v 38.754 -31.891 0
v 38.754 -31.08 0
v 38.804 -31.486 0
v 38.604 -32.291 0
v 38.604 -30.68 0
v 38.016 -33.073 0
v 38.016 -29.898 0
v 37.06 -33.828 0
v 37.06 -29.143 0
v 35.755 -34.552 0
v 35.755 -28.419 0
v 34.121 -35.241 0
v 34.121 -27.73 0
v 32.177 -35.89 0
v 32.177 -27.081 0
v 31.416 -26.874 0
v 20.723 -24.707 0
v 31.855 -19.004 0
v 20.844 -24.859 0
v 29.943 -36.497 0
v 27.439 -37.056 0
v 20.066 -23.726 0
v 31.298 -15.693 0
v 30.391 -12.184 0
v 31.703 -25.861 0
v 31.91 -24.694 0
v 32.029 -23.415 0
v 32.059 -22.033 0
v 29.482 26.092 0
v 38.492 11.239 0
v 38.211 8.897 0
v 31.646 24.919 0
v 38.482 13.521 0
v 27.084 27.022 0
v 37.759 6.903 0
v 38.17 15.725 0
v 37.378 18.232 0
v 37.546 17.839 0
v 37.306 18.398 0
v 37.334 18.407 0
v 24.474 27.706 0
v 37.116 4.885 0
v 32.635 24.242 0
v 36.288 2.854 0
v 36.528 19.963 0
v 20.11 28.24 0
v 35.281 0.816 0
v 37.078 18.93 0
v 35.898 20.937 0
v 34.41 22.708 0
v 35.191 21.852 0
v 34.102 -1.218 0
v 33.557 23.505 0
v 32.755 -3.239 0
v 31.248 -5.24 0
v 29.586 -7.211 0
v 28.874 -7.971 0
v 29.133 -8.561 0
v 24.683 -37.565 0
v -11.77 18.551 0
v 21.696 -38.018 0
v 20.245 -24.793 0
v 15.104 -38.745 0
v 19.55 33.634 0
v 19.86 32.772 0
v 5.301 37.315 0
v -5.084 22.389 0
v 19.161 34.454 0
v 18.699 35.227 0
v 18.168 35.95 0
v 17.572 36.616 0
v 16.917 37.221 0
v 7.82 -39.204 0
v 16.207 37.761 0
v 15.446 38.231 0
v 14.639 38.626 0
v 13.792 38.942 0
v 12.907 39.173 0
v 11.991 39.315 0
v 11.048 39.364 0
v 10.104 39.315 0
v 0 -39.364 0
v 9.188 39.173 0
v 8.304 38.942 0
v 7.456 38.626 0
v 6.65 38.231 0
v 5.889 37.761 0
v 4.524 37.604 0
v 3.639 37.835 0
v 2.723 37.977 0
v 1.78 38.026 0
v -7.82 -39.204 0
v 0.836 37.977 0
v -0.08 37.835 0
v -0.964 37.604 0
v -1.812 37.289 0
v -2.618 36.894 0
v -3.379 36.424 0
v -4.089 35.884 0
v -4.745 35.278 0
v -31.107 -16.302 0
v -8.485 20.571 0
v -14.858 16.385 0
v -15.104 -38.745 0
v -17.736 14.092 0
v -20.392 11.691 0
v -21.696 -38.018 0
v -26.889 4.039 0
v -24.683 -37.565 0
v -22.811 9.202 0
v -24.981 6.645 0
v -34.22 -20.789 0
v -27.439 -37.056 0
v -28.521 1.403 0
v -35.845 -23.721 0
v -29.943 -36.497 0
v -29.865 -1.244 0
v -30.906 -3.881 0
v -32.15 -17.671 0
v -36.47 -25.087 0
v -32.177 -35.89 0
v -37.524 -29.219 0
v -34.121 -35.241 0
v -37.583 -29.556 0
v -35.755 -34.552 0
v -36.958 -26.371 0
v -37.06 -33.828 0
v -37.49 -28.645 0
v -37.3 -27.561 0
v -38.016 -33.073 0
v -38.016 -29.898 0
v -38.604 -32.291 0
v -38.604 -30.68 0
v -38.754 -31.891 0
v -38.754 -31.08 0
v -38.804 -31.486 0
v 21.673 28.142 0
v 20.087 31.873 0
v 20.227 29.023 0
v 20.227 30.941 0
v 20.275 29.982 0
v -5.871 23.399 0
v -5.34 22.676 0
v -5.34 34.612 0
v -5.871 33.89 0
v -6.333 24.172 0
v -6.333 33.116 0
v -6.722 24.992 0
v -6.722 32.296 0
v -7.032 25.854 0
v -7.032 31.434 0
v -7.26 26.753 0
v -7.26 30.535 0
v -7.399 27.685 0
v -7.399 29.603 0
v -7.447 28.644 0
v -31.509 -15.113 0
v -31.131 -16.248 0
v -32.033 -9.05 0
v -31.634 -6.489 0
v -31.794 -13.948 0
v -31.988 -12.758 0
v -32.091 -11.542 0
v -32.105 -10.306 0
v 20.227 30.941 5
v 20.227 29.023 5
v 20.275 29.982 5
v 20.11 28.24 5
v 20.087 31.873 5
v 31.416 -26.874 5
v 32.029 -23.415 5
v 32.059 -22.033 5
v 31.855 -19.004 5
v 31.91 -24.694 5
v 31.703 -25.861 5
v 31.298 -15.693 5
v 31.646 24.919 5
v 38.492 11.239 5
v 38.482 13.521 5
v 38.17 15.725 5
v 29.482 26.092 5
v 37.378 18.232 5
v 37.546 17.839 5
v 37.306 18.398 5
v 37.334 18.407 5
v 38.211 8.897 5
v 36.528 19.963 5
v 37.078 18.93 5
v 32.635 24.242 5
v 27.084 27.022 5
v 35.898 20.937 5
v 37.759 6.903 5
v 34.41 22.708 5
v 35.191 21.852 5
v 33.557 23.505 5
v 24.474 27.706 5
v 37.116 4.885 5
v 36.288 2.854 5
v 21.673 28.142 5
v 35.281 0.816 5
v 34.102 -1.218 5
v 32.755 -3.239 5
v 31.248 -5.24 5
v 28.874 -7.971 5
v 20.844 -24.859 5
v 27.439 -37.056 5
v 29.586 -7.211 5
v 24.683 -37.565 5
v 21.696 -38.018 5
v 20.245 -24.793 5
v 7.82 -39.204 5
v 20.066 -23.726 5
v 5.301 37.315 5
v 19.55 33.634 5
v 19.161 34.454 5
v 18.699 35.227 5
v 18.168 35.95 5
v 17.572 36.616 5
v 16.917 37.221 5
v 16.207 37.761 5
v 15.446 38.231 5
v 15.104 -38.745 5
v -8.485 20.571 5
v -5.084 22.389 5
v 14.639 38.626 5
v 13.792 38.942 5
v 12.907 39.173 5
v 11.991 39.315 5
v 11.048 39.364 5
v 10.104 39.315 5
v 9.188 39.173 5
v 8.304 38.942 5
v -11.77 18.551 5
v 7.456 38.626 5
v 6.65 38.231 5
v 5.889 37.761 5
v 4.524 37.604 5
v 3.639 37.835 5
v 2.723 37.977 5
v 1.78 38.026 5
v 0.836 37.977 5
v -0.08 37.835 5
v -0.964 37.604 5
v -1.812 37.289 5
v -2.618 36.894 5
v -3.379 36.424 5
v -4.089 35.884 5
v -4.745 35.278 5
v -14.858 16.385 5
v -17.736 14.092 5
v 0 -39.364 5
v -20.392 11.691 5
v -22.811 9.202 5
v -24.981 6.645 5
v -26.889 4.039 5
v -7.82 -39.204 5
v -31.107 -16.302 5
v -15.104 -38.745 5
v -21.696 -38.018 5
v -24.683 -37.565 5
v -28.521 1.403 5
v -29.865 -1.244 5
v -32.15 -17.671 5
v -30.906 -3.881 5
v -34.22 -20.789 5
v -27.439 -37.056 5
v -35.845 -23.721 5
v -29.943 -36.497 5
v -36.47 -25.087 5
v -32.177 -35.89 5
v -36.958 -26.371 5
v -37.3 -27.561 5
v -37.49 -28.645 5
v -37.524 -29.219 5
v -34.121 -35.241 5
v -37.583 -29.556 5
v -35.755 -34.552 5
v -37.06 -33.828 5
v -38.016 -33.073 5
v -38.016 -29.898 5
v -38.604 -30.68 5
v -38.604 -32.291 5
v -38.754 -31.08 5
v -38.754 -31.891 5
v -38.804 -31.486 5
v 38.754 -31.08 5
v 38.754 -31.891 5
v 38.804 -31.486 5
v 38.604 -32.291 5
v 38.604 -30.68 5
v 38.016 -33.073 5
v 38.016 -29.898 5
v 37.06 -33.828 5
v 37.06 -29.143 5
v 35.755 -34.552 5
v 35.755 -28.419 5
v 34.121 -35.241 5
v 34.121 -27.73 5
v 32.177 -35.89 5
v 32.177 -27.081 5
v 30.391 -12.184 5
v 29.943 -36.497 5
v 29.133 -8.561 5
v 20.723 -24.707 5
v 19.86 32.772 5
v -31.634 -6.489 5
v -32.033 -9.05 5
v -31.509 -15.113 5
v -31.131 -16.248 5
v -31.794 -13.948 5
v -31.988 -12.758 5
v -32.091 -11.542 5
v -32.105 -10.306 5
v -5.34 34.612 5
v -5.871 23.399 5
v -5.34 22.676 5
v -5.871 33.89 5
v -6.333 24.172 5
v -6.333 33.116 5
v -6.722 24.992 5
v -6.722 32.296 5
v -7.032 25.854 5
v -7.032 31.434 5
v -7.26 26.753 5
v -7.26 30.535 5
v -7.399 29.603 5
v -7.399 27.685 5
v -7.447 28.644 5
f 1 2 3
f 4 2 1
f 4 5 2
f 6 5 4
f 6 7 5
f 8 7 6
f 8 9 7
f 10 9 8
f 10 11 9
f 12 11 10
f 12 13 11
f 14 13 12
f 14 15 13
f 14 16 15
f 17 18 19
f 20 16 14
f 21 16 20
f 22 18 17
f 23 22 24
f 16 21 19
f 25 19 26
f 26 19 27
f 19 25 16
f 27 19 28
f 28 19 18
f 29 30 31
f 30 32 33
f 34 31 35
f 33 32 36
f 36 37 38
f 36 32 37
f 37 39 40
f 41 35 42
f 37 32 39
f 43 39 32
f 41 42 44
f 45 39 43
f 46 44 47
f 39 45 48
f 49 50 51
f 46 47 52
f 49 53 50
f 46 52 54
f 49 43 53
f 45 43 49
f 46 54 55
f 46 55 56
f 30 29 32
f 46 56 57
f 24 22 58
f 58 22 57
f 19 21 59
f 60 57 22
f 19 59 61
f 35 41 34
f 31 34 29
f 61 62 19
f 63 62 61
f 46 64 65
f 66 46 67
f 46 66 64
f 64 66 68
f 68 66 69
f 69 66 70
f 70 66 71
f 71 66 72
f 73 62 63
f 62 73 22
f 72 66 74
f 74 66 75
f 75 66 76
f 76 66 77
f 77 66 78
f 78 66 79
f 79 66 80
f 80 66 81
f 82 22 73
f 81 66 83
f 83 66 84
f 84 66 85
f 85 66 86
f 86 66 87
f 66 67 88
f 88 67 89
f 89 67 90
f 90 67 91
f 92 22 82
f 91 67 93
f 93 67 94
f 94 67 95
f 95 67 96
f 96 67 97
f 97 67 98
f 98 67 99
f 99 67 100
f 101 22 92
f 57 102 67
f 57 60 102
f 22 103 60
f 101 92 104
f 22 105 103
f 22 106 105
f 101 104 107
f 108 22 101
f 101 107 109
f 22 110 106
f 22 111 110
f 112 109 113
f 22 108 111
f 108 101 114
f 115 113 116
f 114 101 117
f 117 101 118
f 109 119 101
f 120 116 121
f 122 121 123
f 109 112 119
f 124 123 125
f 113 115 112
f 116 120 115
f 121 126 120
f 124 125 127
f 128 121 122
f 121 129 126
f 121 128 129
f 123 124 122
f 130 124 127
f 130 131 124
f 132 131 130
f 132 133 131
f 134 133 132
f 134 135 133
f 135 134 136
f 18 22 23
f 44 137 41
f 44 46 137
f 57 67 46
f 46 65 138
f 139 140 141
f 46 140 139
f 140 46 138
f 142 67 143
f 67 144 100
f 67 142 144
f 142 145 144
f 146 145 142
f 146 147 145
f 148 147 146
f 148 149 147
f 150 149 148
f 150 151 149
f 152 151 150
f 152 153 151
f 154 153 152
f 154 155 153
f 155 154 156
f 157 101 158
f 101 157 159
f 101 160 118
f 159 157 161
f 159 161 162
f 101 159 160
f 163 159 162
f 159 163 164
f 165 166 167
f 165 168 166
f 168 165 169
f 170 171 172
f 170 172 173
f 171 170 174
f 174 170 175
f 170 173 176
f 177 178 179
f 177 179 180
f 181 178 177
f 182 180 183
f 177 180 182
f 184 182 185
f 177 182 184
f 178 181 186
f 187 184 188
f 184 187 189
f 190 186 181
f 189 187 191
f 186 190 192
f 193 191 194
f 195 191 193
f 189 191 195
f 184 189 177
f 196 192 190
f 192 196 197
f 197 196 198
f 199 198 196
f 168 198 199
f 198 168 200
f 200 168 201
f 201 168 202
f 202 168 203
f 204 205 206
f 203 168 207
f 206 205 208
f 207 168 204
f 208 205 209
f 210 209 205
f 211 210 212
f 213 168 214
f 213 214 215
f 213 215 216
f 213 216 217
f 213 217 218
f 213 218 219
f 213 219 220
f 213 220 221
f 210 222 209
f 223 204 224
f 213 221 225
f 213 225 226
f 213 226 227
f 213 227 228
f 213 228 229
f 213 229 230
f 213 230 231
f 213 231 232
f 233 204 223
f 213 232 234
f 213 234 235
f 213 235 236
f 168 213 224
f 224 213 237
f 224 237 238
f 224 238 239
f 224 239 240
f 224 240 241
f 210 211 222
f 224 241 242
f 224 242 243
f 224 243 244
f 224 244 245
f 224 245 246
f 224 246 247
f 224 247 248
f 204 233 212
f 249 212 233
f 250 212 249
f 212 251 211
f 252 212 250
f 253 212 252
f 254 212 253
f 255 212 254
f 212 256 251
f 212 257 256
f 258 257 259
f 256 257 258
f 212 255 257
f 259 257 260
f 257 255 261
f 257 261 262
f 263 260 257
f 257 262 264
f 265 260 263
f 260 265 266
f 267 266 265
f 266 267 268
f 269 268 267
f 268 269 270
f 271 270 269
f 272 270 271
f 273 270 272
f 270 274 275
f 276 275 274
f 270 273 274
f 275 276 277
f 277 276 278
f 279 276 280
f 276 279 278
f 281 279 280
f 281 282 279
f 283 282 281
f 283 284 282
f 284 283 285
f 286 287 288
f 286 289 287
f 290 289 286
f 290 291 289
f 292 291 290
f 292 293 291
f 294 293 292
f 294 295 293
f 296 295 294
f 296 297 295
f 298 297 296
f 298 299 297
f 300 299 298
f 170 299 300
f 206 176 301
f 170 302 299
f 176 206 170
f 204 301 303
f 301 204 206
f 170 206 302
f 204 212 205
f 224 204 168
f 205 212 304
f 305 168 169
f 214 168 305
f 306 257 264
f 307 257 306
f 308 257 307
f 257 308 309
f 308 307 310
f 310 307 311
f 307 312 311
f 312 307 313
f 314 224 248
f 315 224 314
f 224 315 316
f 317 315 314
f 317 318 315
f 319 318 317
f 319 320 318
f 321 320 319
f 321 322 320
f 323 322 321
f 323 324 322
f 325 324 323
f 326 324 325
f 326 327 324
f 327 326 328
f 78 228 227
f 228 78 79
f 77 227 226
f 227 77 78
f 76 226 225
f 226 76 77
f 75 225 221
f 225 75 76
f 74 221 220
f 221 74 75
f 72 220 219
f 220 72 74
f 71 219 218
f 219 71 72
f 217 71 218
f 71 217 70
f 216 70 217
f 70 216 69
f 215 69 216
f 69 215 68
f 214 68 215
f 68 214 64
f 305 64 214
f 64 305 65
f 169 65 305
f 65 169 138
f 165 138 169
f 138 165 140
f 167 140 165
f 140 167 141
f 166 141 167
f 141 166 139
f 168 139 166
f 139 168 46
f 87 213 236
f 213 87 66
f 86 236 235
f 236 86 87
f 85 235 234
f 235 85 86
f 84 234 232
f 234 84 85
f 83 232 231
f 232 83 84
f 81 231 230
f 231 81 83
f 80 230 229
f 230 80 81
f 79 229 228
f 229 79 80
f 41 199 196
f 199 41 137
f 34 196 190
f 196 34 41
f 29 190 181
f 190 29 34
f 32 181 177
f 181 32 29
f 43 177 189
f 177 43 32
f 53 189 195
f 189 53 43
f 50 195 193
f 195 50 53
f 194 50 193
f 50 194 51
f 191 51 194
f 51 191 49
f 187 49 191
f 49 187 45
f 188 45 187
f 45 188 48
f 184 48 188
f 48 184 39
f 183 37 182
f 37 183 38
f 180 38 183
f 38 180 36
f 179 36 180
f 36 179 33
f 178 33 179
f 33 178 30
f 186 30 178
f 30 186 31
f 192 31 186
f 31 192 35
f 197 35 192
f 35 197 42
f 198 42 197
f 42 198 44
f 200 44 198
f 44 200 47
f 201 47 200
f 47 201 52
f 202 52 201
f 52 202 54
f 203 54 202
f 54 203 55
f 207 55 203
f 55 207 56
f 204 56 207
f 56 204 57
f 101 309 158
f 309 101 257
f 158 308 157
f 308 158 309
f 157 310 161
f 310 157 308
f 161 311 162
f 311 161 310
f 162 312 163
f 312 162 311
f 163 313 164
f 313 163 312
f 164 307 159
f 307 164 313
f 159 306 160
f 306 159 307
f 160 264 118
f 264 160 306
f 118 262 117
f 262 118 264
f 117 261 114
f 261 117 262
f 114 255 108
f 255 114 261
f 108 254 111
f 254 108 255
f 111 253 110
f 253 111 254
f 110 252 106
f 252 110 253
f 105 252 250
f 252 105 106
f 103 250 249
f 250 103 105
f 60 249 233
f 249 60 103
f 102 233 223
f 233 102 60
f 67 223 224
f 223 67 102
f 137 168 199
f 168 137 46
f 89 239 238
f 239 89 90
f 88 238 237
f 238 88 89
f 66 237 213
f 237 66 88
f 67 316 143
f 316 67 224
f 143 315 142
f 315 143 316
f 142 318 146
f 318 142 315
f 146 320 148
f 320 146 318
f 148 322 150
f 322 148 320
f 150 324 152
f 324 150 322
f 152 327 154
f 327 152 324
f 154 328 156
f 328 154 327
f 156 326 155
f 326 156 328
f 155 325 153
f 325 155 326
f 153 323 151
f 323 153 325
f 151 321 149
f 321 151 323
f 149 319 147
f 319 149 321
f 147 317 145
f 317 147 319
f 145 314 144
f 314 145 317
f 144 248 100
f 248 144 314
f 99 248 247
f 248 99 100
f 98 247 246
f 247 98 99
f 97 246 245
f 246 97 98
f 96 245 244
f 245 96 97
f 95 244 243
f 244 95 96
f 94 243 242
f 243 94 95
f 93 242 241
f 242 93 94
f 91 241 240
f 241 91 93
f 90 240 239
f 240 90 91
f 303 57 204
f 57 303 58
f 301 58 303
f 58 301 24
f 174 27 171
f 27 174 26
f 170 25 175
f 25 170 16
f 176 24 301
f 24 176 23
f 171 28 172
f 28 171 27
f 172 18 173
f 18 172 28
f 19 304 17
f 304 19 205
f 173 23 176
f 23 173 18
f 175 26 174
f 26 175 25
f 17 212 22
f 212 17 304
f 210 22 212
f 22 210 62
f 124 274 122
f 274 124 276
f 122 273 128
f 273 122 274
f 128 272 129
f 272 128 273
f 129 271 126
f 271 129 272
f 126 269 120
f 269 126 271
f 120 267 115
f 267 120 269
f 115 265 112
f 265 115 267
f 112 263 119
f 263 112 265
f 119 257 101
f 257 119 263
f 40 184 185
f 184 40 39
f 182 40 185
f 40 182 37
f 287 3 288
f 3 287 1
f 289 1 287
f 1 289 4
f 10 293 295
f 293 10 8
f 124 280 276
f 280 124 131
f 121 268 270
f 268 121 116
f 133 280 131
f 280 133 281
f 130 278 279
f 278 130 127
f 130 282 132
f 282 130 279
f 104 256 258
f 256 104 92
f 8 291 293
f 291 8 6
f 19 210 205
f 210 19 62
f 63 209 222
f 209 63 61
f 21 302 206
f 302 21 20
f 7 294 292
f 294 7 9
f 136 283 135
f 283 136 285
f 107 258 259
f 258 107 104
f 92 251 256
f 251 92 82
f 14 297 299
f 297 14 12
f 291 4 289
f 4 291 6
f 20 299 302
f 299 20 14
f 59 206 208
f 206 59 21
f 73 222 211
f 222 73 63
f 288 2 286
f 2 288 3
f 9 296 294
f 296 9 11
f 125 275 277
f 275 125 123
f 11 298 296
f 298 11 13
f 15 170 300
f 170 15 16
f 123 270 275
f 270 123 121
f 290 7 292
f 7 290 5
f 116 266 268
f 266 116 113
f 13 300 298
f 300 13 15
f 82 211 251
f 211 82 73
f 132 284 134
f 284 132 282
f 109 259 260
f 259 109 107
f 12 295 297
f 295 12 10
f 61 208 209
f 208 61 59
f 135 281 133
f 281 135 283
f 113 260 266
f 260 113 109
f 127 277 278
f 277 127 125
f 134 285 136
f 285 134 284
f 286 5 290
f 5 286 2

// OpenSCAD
// Module names are of the form poly_<inkscape-path-id>().  As a result,
// you can associate a polygon in this OpenSCAD program with the corresponding
// SVG element in the Inkscape document by looking for the XML element with
// the attribute id="inkscape-path-id".

// fudge value is used to ensure that subtracted solids are a tad taller
// in the z dimension than the polygon being subtracted from.  This helps
// keep the resulting .stl file manifold.
fudge = 0.1;

module poly_path6(h)
{
  scale([25.4/90, -25.4/90, 1]) union()
  {
    linear_extrude(height=h)
      polygon([[21.904000,-23.699447],[18.159686,-23.256568],[13.863359,-22.052978],[9.058697,-20.099623],[3.789375,-17.407447],[-1.900932,-13.987396],[-7.968547,-9.850416],[-14.369795,-5.007451],[-21.061000,0.530553],[-32.318596,10.886240],[-42.953703,21.918053],[-52.727553,33.291115],[-61.401375,44.670553],[-68.736400,55.721490],[-74.493859,66.109053],[-76.706386,70.949420],[-78.434982,75.498365],[-79.649802,79.714030],[-80.321000,83.554553],[-80.441000,85.589553],[-80.971000,88.586553],[-80.644645,91.008783],[-79.686816,93.361379],[-78.129369,95.632386],[-76.004156,97.809850],[-73.343034,99.881815],[-70.177855,101.836328],[-66.540476,103.661434],[-62.462750,105.345178],[-53.113676,108.240762],[-42.385469,110.427444],[-30.532965,111.809586],[-17.811000,112.291553],[-5.089451,111.809586],[6.762578,110.427444],[17.490287,108.240762],[26.838875,105.345178],[30.916373,103.661434],[34.553541,101.836328],[37.718528,99.881815],[40.379484,97.809850],[42.504560,95.632386],[44.061904,93.361379],[45.019668,91.008783],[45.346000,88.586553],[45.019667,86.164147],[44.061902,83.811397],[42.504553,81.540256],[40.379469,79.362678],[37.718498,77.290616],[34.553488,75.336022],[30.916290,73.510850],[26.838750,71.827053],[17.490043,68.931397],[6.762156,66.744678],[-5.090121,65.362522],[-17.812000,64.880553],[-21.976000,64.936553],[-11.821072,54.951094],[-2.305578,44.530319],[6.379924,33.941379],[14.044875,23.451428],[20.498717,13.327617],[25.550891,3.837100],[29.010838,-4.752972],[30.084177,-8.626856],[30.688000,-12.175447],[30.810910,-14.938535],[30.556781,-17.317025],[29.939699,-19.314258],[28.973750,-20.933572],[27.673020,-22.178308],[26.051594,-23.051806],[24.123559,-23.557406],[21.903000,-23.698447]]);
  }
}

module poly_path10(h)
{
  scale([25.4/90, -25.4/90, 1]) union()
  {
    linear_extrude(height=h)
      polygon([[71.840243,-106.234993],[71.671446,-102.835957],[71.176013,-99.535111],[70.370376,-96.349166],[69.270970,-93.294831],[67.894229,-90.388817],[66.256587,-87.647833],[64.374478,-85.088590],[62.264335,-82.727797],[59.942592,-80.582163],[57.425684,-78.668400],[54.730045,-77.003217],[51.872108,-75.603324],[48.868307,-74.485430],[45.735076,-73.666246],[42.488850,-73.162482],[39.146062,-72.990847],[35.803273,-73.162490],[32.557047,-73.666279],[29.423816,-74.485498],[26.420015,-75.603435],[23.562078,-77.003377],[20.866439,-78.668609],[18.349531,-80.582420],[16.027788,-82.728094],[13.917645,-85.088919],[12.035536,-87.648182],[10.397894,-90.389169],[9.021153,-93.295166],[7.921747,-96.349460],[7.116110,-99.535339],[6.620677,-102.836087],[6.451880,-106.234993],[6.620669,-109.633881],[7.116080,-112.934579],[7.921682,-116.120379],[9.021043,-119.174572],[10.397731,-122.080450],[12.035313,-124.821302],[13.917359,-127.380422],[16.027437,-129.741099],[18.349113,-131.886626],[20.865958,-133.800293],[23.561538,-135.465391],[26.419422,-136.865213],[29.423178,-137.983048],[32.556373,-138.802190],[35.802578,-139.305927],[39.145358,-139.477553],[42.488146,-139.305927],[45.734373,-138.802190],[48.867603,-137.983048],[51.871404,-136.865213],[54.729341,-135.465391],[57.424981,-133.800293],[59.941889,-131.886626],[62.263631,-129.741099],[64.373774,-127.380422],[66.255884,-124.821302],[67.893526,-122.080450],[69.270267,-119.174572],[70.369673,-116.120379],[71.175309,-112.934579],[71.670743,-109.633881],[71.839539,-106.234993]]);
  }
}

module poly_path12(h)
{
  scale([25.4/90, -25.4/90, 1]) union()
  {
    linear_extrude(height=h)
      polygon([[59.527000,-111.352447],[59.332057,-109.253517],[58.772953,-107.298635],[57.888279,-105.529658],[56.716625,-103.988447],[55.296580,-102.716861],[53.666734,-101.756760],[51.865678,-101.150002],[49.932000,-100.938447],[47.998035,-101.149918],[46.196844,-101.756463],[44.566980,-102.716281],[43.147000,-103.987572],[41.975457,-105.528535],[41.090906,-107.297369],[40.531902,-109.252273],[40.337000,-111.351447],[40.531943,-113.449802],[41.091047,-115.404416],[41.975721,-117.173357],[43.147375,-118.714697],[44.567420,-119.986506],[46.197266,-120.946853],[47.998322,-121.553810],[49.932000,-121.765447],[51.865965,-121.553851],[53.667156,-120.946994],[55.297020,-119.986769],[56.717000,-118.715072],[57.888543,-117.173797],[58.773094,-115.404838],[59.332098,-113.450090],[59.527000,-111.351447]]);
  }
}

module poly_path14(h)
{
  scale([25.4/90, -25.4/90, 1]) union()
  {
    linear_extrude(height=h)
      polygon([[133.036000,-63.209447],[135.248562,-55.720244],[136.354500,-47.907322],[136.390188,-39.824213],[135.392000,-31.524447],[133.790044,-24.458743],[131.511943,-17.310578],[128.578914,-10.111375],[125.012172,-2.892556],[120.832931,4.314456],[116.062408,11.478239],[110.721818,18.567370],[104.832375,25.550428],[98.415296,32.395990],[91.491795,39.072633],[84.083088,45.548936],[76.210391,51.793475],[67.894918,57.774829],[59.157885,63.461574],[50.020507,68.822290],[40.504000,73.825553],[27.913412,79.603953],[15.391059,84.438346],[3.012747,88.336897],[-9.145719,91.307772],[-21.008532,93.359135],[-32.499887,94.499151],[-43.543978,94.735985],[-54.065000,94.077803],[-63.987147,92.532769],[-73.234613,90.109049],[-81.731593,86.814807],[-89.402281,82.658209],[-92.904076,80.259078],[-96.170872,77.647420],[-99.193191,74.824255],[-101.961559,71.790604],[-104.466499,68.547488],[-106.698537,65.095927],[-108.648195,61.436941],[-110.306000,57.571553],[-111.647260,53.549001],[-112.657292,49.423585],[-113.341909,45.203917],[-113.706926,40.898608],[-113.758157,36.516268],[-113.501417,32.065509],[-112.087281,22.993178],[-109.511032,13.750503],[-105.819184,4.406373],[-101.058251,-4.970323],[-95.274750,-14.310697],[-88.515194,-23.545860],[-80.826098,-32.606924],[-72.253976,-41.424999],[-62.845344,-49.931197],[-52.646715,-58.056630],[-41.704605,-65.732408],[-30.065529,-72.889643],[-17.776000,-79.459447],[-5.184884,-85.238540],[7.337932,-90.073519],[19.716644,-93.972560],[31.875453,-96.943838],[43.738557,-98.995527],[55.230154,-100.135804],[66.274444,-100.372844],[76.795625,-99.714822],[86.717896,-98.169913],[95.965455,-95.746293],[104.462502,-92.452136],[112.133234,-88.295619],[115.635045,-85.896530],[118.901852,-83.284916],[121.924179,-80.461800],[124.692553,-77.428203],[127.197497,-74.185147],[129.429536,-70.733655],[131.379195,-67.074747],[133.037000,-63.209447]]);
  }
}

module poly_path16(h)
{
  scale([25.4/90, -25.4/90, 1]) union()
  {
    linear_extrude(height=h)
      polygon([[39.001243,-101.494993],[38.832446,-98.095957],[38.337013,-94.795111],[37.531376,-91.609166],[36.431970,-88.554831],[35.055229,-85.648817],[33.417587,-82.907833],[31.535478,-80.348590],[29.425335,-77.987797],[27.103592,-75.842163],[24.586684,-73.928400],[21.891045,-72.263217],[19.033108,-70.863324],[16.029307,-69.745430],[12.896076,-68.926246],[9.649850,-68.422482],[6.307062,-68.250847],[2.964273,-68.422490],[-0.281953,-68.926279],[-3.415184,-69.745498],[-6.418985,-70.863435],[-9.276922,-72.263377],[-11.972561,-73.928609],[-14.489469,-75.842420],[-16.811212,-77.988094],[-18.921355,-80.348919],[-20.803464,-82.908182],[-22.441106,-85.649169],[-23.817847,-88.555166],[-24.917253,-91.609460],[-25.722890,-94.795339],[-26.218323,-98.096087],[-26.387120,-101.494993],[-26.218331,-104.893881],[-25.722920,-108.194579],[-24.917318,-111.380379],[-23.817957,-114.434572],[-22.441269,-117.340450],[-20.803687,-120.081302],[-18.921641,-122.640422],[-16.811563,-125.001099],[-14.489887,-127.146626],[-11.973042,-129.060293],[-9.277462,-130.725391],[-6.419578,-132.125213],[-3.415822,-133.243048],[-0.282627,-134.062190],[2.963578,-134.565927],[6.306358,-134.737553],[9.649146,-134.565927],[12.895373,-134.062190],[16.028603,-133.243048],[19.032404,-132.125213],[21.890341,-130.725391],[24.585981,-129.060293],[27.102889,-127.146626],[29.424631,-125.001099],[31.534774,-122.640422],[33.416884,-120.081302],[35.054526,-117.340450],[36.431267,-114.434572],[37.530673,-111.380379],[38.336309,-108.194579],[38.831743,-104.893881],[39.000539,-101.494993]]);
  }
}

module poly_path8(h)
{
  scale([25.4/90, -25.4/90, 1]) union()
  {
    linear_extrude(height=h)
      polygon([[103.227447,30.335655],[107.684213,43.170882],[110.899532,55.605011],[112.870459,67.337899],[113.594049,78.069402],[113.487172,82.965839],[113.067357,87.499376],[112.334234,91.632495],[111.287437,95.327679],[109.926597,98.547408],[108.251345,101.254166],[106.261315,103.410433],[103.956136,104.978693],[101.397860,105.902020],[98.664961,106.165346],[95.781714,105.793944],[92.772391,104.813083],[89.661265,103.248037],[86.472609,101.124076],[83.230695,98.466472],[79.959798,95.300495],[76.684189,91.651417],[73.428143,87.544510],[67.071826,78.058292],[61.085031,67.044012],[55.661943,54.703840],[51.205294,41.868912],[47.990089,29.435073],[46.019268,17.702457],[45.295774,6.971197],[45.402693,2.074868],[45.822547,-2.458572],[46.555702,-6.591605],[47.602528,-10.286716],[48.963392,-13.506387],[50.638660,-16.213101],[52.628701,-18.369342],[54.933883,-19.937593],[57.492156,-20.860928],[60.225044,-21.124281],[63.108274,-20.752922],[66.117575,-19.772120],[69.228672,-18.207147],[72.417295,-16.083272],[75.659170,-13.425764],[78.930025,-10.259896],[82.205587,-6.610935],[85.461585,-2.504154],[91.817795,6.981793],[97.804476,17.995783],[103.227447,30.335655]]);
  }
}

module poly_path18(h)
{
  scale([25.4/90, -25.4/90, 1]) union()
  {
    linear_extrude(height=h)
      polygon([[34.468000,-106.611447],[34.273057,-104.513092],[33.713953,-102.558478],[32.829279,-100.789537],[31.657625,-99.248197],[30.237580,-97.976388],[28.607734,-97.016041],[26.806678,-96.409084],[24.873000,-96.197447],[22.938992,-96.409043],[21.137687,-97.015900],[19.507664,-97.976125],[18.087500,-99.247822],[16.915773,-100.789097],[16.031062,-102.558056],[15.471945,-104.512804],[15.277000,-106.611447],[15.471943,-108.710377],[16.031047,-110.665260],[16.915721,-112.434236],[18.087375,-113.975447],[19.507420,-115.247033],[21.137266,-116.207135],[22.938322,-116.813892],[24.872000,-117.025447],[26.805348,-116.813892],[28.606156,-116.207135],[30.235824,-115.247033],[31.655750,-113.975447],[32.827332,-112.434236],[33.711969,-110.665260],[34.271059,-108.710377],[34.466000,-106.611447]]);
  }
}

module poly_path20(h)
{
  scale([25.4/90, -25.4/90, 1]) union()
  {
    linear_extrude(height=h)
      polygon([[62.379447,52.559655],[66.836213,65.394882],[70.051532,77.829011],[72.022459,89.561899],[72.746049,100.293402],[72.639172,105.189839],[72.219357,109.723376],[71.486234,113.856495],[70.439437,117.551679],[69.078597,120.771408],[67.403345,123.478166],[65.413315,125.634433],[63.108136,127.202693],[60.549860,128.126020],[57.816961,128.389346],[54.933714,128.017944],[51.924391,127.037083],[48.813265,125.472037],[45.624609,123.348076],[42.382695,120.690472],[39.111798,117.524495],[35.836189,113.875417],[32.580143,109.768510],[26.223826,100.282292],[20.237031,89.268012],[14.813943,76.927840],[10.357294,64.092912],[7.142089,51.659073],[5.171268,39.926457],[4.447774,29.195197],[4.554693,24.298868],[4.974547,19.765428],[5.707702,15.632395],[6.754528,11.937284],[8.115392,8.717613],[9.790660,6.010899],[11.780701,3.854658],[14.085883,2.286407],[16.644156,1.363072],[19.377044,1.099719],[22.260274,1.471078],[25.269575,2.451880],[28.380672,4.016853],[31.569295,6.140728],[34.811170,8.798236],[38.082025,11.964104],[41.357587,15.613065],[44.613585,19.719846],[50.969795,29.205793],[56.956476,40.219783],[62.379447,52.559655]]);
  }
}

module poly_path22(h)
{
  scale([25.4/90, -25.4/90, 1]) union()
  {
    linear_extrude(height=h)
      polygon([[35.094000,4.737553],[34.941367,7.327887],[34.493373,9.843401],[32.770734,14.599022],[30.044947,18.902533],[26.434875,22.652053],[22.059381,25.745698],[17.037328,28.081584],[11.487580,29.557830],[5.529000,30.072553],[-0.429293,29.557830],[-5.978906,28.081584],[-11.000941,25.745698],[-15.376500,22.652053],[-18.986684,18.902533],[-21.712594,14.599022],[-23.435332,9.843401],[-23.883356,7.327887],[-24.036000,4.737553],[-23.883356,2.147219],[-23.435332,-0.368295],[-21.712594,-5.123916],[-18.986684,-9.427427],[-15.376500,-13.176947],[-11.000941,-16.270592],[-5.978906,-18.606478],[-0.429293,-20.082724],[5.529000,-20.597447],[11.487910,-20.082724],[17.037906,-18.606478],[22.060137,-16.270592],[26.435750,-13.176947],[30.045895,-9.427427],[32.771719,-5.123916],[34.494371,-0.368295],[34.942367,2.147219],[35.095000,4.737553]]);
  }
}

module poly_path24(h)
{
  scale([25.4/90, -25.4/90, 1]) union()
  {
    linear_extrude(height=h)
      polygon([[-30.616000,-5.756447],[-34.358996,-5.314228],[-38.654344,-4.111134],[-43.458332,-2.158134],[-48.727250,0.533803],[-54.417387,3.953709],[-60.485031,8.090616],[-66.886473,12.933553],[-73.578000,18.471553],[-84.835596,28.827571],[-95.470703,39.859631],[-105.244553,51.232871],[-113.918375,62.612428],[-121.253400,73.663438],[-127.010859,84.051037],[-129.223386,88.891414],[-130.951982,93.440364],[-132.166802,97.656029],[-132.838000,101.496553],[-132.958000,103.531553],[-133.488000,106.529553],[-133.161667,108.951959],[-132.203898,111.304709],[-130.646540,113.575850],[-128.521438,115.753428],[-125.860437,117.825490],[-122.695383,119.780084],[-119.058122,121.605256],[-114.980500,123.289053],[-105.631555,126.184709],[-94.903313,128.371428],[-83.050539,129.753584],[-70.328000,130.235553],[-57.606738,129.753584],[-45.754844,128.371428],[-35.027152,126.184709],[-25.678500,123.289053],[-21.600950,121.605256],[-17.963723,119.780084],[-14.798673,117.825490],[-12.137656,115.753428],[-10.012526,113.575850],[-8.455137,111.304709],[-7.497343,108.951959],[-7.171000,106.529553],[-7.497333,104.107147],[-8.455098,101.754397],[-10.012447,99.483256],[-12.137531,97.305678],[-14.798502,95.233616],[-17.963512,93.279022],[-21.600710,91.453850],[-25.678250,89.770053],[-35.026957,86.874397],[-45.754844,84.687678],[-57.607121,83.305522],[-70.329000,82.823553],[-74.493000,82.878553],[-64.338359,72.893094],[-54.823000,62.472319],[-46.137516,51.883379],[-38.472500,41.393428],[-32.018547,31.269617],[-26.966250,21.779100],[-23.506203,13.189028],[-22.432834,9.315144],[-21.829000,5.766553],[-21.706092,3.003467],[-21.960234,0.624991],[-22.577354,-1.372205],[-23.543375,-2.991447],[-24.844225,-4.236064],[-26.465828,-5.109384],[-28.394111,-5.614736],[-30.615000,-5.755447]]);
  }
}

module poly_path26(h)
{
  scale([25.4/90, -25.4/90, 1]) union()
  {
    linear_extrude(height=h)
      polygon([[40.477000,-35.884447],[58.633854,-38.221216],[74.257834,-40.606287],[87.536877,-43.014930],[98.658922,-45.422416],[107.811906,-47.804015],[115.183768,-50.134998],[120.962445,-52.390635],[125.335875,-54.546197],[128.491997,-56.576954],[130.618748,-58.458177],[131.904067,-60.165137],[132.535891,-61.673103],[132.702158,-62.957347],[132.590807,-63.993138],[132.287000,-65.220447]]);
  }
}

module poly_path4(h)
{
  scale([25.4/90, -25.4/90, 1]) union()
  {
    linear_extrude(height=h)
      polygon([[-137.496000,111.563553],[-137.317088,112.999962],[-136.786113,114.417519],[-134.702531,117.189061],[-131.314371,119.864146],[-126.690750,122.428741],[-120.900785,124.868812],[-114.013594,127.170326],[-106.098293,129.319251],[-97.224000,131.301553],[-87.459832,133.103199],[-76.874906,134.710155],[-53.519250,137.283865],[-27.709969,138.910420],[0.000000,139.477553],[27.710256,138.910420],[53.519672,137.283865],[76.875346,134.710155],[87.460247,133.103199],[97.224375,131.301553],[106.098616,129.319251],[114.013857,127.170326],[120.900987,124.868812],[126.690891,122.428741],[131.314457,119.864146],[134.702572,117.189061],[136.786124,114.417519],[137.317091,112.999962],[137.496000,111.563553],[137.317088,110.127053],[136.786113,108.709411],[134.702531,105.937715],[131.314371,103.262497],[126.690750,100.697787],[120.900785,98.257619],[114.013594,95.956024],[106.098293,93.807033],[97.224000,91.824678],[87.459832,90.022991],[76.874906,88.416004],[53.519250,85.842256],[27.709969,84.215688],[0.000000,83.648553],[-27.709969,84.215688],[-53.519250,85.842256],[-76.874906,88.416004],[-87.459832,90.022991],[-97.224000,91.824678],[-106.098293,93.807033],[-114.013594,95.956024],[-120.900785,98.257619],[-126.690750,100.697787],[-131.314371,103.262497],[-134.702531,105.937715],[-136.786113,108.709411],[-137.317088,110.127053],[-137.496000,111.563553]]);
  }
}

poly_path6(5);
poly_path10(5);
poly_path12(5);
poly_path14(5);
poly_path16(5);
poly_path8(5);
poly_path18(5);
poly_path20(5);
poly_path22(5);
poly_path24(5);
poly_path26(5);
poly_path4(5);
